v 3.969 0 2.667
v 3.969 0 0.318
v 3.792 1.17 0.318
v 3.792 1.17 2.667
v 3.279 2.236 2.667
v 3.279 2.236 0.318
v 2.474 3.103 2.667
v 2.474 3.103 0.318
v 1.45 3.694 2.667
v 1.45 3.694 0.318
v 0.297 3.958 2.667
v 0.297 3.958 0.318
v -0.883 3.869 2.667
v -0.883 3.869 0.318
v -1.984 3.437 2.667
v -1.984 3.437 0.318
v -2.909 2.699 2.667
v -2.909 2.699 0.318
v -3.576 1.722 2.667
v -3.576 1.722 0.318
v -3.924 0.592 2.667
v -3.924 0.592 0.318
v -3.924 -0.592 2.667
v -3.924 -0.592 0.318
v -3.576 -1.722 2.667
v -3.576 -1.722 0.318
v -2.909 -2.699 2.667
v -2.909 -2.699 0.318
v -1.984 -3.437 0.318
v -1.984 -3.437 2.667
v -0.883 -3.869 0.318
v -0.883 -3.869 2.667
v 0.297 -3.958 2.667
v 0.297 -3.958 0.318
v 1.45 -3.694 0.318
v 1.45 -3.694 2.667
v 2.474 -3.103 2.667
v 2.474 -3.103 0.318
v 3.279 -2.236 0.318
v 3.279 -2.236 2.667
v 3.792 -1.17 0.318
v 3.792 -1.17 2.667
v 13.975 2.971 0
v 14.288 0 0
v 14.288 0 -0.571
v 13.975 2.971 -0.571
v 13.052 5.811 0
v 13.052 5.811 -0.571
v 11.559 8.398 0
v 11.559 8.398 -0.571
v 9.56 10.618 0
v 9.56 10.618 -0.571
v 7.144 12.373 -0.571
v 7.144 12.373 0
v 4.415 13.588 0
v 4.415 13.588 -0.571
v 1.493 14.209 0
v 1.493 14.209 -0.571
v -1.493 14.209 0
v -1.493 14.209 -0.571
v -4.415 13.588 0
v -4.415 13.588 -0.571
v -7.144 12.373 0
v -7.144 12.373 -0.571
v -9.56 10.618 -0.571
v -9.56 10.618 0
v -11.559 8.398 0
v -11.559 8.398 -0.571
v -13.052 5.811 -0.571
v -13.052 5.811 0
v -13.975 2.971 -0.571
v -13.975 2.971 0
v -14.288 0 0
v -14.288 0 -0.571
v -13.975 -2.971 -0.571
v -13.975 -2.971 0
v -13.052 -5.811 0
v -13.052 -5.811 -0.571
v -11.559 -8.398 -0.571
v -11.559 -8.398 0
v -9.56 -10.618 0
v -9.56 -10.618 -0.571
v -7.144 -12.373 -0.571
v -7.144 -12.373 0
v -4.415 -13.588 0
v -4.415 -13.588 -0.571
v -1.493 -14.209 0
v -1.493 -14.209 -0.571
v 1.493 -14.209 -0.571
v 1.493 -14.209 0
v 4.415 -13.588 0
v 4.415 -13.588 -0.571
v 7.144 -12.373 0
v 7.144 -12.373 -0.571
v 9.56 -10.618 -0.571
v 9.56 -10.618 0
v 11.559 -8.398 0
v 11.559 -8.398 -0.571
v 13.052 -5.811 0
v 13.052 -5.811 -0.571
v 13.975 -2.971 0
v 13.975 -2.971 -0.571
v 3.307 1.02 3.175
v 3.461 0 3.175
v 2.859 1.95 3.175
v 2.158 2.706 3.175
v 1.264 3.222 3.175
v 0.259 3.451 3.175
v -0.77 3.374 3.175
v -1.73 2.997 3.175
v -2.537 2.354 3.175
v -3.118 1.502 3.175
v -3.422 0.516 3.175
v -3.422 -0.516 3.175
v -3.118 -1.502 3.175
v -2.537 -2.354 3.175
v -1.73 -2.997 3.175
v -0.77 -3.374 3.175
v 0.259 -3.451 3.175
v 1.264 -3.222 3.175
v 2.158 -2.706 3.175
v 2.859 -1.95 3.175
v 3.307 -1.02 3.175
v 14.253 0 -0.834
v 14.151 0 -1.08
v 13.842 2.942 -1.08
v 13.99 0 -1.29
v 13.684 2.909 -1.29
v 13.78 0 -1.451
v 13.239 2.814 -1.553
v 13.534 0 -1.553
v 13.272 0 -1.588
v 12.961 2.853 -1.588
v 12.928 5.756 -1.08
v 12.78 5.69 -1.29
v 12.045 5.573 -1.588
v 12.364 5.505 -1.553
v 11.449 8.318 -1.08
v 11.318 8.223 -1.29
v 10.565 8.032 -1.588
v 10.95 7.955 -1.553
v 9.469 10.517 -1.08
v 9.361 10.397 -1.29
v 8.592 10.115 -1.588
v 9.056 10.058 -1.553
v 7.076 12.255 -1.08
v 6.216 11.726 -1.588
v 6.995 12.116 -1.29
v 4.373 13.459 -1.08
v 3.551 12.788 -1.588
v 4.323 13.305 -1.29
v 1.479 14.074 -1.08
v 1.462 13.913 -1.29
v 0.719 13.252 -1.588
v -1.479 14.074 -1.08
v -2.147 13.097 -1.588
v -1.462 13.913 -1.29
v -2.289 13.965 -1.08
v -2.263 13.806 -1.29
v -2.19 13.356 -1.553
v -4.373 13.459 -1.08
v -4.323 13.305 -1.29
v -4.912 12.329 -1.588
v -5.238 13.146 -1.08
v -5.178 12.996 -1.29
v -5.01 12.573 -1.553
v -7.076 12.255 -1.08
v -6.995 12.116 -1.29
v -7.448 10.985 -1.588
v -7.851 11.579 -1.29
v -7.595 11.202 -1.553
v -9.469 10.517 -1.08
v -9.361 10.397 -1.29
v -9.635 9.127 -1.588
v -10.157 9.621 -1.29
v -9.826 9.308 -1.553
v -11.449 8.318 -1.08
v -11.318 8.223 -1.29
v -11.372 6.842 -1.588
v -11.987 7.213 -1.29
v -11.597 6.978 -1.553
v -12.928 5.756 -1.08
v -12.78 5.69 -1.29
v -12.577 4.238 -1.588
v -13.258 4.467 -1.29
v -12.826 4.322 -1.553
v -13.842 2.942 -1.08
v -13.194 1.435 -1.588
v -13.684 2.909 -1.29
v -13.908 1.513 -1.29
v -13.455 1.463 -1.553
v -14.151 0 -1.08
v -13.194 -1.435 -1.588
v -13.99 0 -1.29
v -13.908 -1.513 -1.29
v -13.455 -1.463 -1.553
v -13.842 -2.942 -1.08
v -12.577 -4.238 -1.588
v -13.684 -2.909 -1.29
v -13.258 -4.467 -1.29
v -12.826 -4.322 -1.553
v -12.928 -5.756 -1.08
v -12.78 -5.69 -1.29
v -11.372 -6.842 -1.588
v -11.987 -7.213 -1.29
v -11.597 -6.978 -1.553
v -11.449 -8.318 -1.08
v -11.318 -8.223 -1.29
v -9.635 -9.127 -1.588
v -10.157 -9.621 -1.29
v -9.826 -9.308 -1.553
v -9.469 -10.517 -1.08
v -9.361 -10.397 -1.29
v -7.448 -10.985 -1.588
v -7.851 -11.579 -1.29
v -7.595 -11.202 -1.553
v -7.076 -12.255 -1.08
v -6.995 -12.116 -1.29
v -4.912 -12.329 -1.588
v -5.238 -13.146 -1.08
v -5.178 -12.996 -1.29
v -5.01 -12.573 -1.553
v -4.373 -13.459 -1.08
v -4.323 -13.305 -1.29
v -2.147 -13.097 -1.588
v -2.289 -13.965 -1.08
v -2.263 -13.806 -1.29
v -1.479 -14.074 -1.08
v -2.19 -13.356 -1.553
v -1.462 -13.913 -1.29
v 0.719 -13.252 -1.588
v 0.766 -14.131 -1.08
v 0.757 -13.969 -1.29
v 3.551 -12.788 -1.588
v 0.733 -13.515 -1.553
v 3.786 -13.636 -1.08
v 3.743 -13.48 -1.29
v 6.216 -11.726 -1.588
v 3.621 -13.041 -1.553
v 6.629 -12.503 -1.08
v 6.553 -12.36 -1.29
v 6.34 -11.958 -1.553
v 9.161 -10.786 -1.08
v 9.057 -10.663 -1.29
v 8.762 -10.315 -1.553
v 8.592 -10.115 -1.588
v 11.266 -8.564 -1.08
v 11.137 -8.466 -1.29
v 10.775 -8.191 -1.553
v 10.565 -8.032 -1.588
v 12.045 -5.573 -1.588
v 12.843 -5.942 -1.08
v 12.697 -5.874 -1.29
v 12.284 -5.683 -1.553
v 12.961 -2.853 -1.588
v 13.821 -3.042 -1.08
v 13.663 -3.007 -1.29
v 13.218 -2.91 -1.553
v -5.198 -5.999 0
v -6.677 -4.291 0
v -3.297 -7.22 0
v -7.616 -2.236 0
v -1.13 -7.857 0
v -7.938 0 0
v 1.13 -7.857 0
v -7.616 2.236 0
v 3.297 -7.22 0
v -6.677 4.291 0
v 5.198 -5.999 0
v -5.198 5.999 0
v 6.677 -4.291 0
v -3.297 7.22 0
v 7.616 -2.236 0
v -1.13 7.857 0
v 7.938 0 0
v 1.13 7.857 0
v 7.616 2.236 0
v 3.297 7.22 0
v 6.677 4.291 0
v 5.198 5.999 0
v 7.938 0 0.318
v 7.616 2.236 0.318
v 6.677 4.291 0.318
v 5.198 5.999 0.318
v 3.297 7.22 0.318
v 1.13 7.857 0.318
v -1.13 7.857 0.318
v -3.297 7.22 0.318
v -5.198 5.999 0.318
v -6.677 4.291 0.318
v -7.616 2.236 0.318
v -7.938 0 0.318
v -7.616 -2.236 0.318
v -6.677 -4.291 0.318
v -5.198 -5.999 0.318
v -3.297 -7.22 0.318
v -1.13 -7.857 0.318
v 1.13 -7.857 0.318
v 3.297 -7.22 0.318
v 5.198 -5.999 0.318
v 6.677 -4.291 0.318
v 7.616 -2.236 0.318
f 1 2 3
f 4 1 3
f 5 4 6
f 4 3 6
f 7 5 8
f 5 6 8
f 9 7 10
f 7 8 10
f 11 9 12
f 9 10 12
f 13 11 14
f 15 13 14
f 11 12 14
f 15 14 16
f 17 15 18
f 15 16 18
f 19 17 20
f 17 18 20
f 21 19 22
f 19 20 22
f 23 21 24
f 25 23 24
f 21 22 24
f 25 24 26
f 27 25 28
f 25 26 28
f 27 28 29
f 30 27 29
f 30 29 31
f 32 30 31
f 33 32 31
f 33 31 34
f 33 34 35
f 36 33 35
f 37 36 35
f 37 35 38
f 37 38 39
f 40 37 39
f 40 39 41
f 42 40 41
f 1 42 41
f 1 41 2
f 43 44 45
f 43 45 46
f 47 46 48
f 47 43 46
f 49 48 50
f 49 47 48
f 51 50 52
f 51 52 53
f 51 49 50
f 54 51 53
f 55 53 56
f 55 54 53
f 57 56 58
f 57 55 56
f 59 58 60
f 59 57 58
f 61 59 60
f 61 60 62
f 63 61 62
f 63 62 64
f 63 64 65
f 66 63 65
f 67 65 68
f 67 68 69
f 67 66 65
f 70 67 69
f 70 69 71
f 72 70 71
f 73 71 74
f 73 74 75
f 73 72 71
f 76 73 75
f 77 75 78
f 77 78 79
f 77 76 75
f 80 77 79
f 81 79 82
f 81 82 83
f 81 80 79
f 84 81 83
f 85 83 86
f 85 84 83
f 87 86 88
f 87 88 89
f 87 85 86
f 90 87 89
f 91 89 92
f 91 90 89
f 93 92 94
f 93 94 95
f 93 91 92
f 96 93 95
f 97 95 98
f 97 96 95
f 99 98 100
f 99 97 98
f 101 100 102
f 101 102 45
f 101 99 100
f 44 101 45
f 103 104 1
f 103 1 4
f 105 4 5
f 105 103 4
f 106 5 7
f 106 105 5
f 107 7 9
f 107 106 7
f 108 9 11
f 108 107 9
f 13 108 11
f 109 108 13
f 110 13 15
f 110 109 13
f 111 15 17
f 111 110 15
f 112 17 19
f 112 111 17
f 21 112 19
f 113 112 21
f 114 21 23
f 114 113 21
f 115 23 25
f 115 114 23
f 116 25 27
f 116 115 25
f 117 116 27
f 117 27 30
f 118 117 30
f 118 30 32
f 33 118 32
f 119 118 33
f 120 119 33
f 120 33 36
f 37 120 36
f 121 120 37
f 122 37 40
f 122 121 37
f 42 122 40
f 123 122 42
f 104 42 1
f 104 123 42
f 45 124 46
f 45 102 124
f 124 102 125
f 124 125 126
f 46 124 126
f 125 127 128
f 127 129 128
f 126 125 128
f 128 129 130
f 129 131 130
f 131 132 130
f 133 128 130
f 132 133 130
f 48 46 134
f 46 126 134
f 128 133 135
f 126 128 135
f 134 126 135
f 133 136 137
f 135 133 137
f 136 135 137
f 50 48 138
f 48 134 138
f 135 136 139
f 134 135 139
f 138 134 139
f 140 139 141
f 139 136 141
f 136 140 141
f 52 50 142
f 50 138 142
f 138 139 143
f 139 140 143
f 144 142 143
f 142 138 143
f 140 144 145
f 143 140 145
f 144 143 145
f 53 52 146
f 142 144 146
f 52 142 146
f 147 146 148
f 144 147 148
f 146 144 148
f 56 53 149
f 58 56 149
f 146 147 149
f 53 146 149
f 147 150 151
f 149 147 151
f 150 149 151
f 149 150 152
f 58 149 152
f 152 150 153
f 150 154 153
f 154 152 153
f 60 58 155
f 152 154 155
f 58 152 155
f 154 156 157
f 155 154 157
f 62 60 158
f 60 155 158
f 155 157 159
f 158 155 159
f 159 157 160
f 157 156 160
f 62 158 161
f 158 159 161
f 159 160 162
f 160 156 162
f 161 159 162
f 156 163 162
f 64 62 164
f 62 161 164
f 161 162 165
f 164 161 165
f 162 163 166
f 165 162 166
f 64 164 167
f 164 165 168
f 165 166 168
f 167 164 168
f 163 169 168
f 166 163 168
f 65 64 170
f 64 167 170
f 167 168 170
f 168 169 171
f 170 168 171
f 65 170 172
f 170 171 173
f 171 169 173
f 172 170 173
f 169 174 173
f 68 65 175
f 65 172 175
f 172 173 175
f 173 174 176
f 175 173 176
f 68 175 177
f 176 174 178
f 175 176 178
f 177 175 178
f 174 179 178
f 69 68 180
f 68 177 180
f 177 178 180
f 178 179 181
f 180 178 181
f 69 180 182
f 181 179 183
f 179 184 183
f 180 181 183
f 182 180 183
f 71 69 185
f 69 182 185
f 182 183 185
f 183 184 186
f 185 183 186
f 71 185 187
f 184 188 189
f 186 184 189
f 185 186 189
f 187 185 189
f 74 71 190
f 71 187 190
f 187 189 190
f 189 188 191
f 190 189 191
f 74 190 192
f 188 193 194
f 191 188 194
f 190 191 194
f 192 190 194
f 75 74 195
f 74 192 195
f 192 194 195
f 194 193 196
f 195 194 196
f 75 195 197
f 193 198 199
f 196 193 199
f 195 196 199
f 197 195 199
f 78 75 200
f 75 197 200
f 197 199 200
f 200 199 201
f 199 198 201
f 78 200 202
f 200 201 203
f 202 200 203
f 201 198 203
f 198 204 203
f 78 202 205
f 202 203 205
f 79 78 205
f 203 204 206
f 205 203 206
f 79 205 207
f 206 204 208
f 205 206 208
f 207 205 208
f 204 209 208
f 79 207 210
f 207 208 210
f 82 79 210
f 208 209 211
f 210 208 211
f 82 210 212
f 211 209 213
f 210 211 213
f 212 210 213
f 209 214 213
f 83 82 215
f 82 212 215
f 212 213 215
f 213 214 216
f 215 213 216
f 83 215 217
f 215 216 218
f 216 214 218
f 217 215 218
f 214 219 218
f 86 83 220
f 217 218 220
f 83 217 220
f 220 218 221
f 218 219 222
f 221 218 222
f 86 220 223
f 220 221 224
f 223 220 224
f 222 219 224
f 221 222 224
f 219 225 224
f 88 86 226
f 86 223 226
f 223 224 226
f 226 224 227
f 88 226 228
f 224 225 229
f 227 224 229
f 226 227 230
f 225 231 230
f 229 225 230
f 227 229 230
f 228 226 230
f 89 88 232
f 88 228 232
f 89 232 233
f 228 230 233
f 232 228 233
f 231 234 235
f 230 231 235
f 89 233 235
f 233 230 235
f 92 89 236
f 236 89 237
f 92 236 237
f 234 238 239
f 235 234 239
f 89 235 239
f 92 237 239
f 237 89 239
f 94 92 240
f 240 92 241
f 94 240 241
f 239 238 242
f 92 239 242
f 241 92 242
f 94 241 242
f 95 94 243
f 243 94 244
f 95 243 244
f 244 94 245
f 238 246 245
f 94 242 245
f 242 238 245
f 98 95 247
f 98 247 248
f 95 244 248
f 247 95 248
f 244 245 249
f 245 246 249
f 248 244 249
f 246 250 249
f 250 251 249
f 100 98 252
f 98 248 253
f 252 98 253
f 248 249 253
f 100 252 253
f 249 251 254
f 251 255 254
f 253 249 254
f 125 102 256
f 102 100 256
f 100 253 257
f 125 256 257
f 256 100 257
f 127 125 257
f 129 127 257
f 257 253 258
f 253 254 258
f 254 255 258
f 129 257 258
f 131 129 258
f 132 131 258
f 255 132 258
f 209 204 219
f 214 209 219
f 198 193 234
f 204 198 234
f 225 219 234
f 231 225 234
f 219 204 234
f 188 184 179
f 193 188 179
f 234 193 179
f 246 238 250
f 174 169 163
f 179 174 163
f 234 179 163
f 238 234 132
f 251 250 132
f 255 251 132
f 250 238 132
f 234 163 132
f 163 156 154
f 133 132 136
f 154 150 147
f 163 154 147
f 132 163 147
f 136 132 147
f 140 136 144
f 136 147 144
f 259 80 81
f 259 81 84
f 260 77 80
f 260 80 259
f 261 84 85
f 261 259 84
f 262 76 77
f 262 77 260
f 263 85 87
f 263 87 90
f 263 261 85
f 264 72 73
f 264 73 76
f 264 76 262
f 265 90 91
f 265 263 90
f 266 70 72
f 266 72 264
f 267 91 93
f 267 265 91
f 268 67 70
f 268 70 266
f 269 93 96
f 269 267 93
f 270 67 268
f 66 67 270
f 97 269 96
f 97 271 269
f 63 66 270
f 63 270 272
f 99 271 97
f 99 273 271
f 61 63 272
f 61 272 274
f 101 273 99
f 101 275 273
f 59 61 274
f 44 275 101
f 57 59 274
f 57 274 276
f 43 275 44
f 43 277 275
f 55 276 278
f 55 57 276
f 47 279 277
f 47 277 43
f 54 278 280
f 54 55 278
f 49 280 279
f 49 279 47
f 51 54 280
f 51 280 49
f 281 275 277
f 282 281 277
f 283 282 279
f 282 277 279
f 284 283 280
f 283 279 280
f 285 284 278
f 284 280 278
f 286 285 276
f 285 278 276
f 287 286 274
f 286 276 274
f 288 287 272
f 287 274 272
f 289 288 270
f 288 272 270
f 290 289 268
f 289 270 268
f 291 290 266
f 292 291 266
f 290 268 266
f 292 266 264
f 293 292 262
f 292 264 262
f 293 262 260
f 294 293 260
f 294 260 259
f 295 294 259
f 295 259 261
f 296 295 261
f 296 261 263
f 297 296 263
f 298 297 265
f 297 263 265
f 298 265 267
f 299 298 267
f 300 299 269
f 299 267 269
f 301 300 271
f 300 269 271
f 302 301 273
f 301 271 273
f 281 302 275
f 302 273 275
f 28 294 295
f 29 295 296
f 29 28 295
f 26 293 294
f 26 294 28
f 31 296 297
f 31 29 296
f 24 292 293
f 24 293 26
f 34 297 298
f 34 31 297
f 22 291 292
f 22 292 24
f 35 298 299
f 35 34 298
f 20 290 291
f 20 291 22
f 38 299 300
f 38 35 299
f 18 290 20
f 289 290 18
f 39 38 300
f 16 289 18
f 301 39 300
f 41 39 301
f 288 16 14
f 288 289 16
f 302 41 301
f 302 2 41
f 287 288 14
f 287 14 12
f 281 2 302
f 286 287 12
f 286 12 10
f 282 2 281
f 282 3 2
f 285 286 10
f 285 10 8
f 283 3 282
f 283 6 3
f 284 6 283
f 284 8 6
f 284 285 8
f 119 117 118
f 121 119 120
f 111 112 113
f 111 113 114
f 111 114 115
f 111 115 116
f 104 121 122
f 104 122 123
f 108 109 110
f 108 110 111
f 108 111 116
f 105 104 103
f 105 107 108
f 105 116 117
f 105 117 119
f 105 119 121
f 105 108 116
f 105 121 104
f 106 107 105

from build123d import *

# Parameters (mm, degrees)
F0_R     = 14.2875
F0_R_2   = 7.9375
F0_R_3   = 3.96875
F1_DEPTH = 1.5875
F2_DEPTH = 3.175
F3_R     = 1.016
F4_DEPTH = 0.3175
F5_SIZE  = 0.508


with BuildPart() as f1:
    # F0 (on Top) → F1 (new body)
    with BuildSketch(Plane.XY):
        Circle(F0_R)
        Circle(F0_R_2, mode=Mode.SUBTRACT)
        Circle(F0_R_2)
        Circle(F0_R_3, mode=Mode.SUBTRACT)
        Circle(F0_R_3)
    extrude(amount=-F1_DEPTH)

    # F0 (on Top) → F2 (join)
    with BuildSketch(Plane.XY):
        Circle(F0_R_3)
    extrude(amount=F2_DEPTH)

    # F3
    f3_edges = [f1.edges().sort_by_distance(p)[0] for p in [
        (-14.2875, 0, -1.5875),
    ]]
    fillet(f3_edges, radius=F3_R)

    # F0 (on Top) → F4 (join)
    with BuildSketch(Plane.XY):
        Circle(F0_R_2)
        Circle(F0_R_3, mode=Mode.SUBTRACT)
    extrude(amount=F4_DEPTH)

    # F5
    f5_edges = [f1.edges().sort_by_distance(p)[0] for p in [
        (-3.96875, 0, 3.175),
    ]]
    chamfer(f5_edges, length=F5_SIZE)


solid = f1.part
